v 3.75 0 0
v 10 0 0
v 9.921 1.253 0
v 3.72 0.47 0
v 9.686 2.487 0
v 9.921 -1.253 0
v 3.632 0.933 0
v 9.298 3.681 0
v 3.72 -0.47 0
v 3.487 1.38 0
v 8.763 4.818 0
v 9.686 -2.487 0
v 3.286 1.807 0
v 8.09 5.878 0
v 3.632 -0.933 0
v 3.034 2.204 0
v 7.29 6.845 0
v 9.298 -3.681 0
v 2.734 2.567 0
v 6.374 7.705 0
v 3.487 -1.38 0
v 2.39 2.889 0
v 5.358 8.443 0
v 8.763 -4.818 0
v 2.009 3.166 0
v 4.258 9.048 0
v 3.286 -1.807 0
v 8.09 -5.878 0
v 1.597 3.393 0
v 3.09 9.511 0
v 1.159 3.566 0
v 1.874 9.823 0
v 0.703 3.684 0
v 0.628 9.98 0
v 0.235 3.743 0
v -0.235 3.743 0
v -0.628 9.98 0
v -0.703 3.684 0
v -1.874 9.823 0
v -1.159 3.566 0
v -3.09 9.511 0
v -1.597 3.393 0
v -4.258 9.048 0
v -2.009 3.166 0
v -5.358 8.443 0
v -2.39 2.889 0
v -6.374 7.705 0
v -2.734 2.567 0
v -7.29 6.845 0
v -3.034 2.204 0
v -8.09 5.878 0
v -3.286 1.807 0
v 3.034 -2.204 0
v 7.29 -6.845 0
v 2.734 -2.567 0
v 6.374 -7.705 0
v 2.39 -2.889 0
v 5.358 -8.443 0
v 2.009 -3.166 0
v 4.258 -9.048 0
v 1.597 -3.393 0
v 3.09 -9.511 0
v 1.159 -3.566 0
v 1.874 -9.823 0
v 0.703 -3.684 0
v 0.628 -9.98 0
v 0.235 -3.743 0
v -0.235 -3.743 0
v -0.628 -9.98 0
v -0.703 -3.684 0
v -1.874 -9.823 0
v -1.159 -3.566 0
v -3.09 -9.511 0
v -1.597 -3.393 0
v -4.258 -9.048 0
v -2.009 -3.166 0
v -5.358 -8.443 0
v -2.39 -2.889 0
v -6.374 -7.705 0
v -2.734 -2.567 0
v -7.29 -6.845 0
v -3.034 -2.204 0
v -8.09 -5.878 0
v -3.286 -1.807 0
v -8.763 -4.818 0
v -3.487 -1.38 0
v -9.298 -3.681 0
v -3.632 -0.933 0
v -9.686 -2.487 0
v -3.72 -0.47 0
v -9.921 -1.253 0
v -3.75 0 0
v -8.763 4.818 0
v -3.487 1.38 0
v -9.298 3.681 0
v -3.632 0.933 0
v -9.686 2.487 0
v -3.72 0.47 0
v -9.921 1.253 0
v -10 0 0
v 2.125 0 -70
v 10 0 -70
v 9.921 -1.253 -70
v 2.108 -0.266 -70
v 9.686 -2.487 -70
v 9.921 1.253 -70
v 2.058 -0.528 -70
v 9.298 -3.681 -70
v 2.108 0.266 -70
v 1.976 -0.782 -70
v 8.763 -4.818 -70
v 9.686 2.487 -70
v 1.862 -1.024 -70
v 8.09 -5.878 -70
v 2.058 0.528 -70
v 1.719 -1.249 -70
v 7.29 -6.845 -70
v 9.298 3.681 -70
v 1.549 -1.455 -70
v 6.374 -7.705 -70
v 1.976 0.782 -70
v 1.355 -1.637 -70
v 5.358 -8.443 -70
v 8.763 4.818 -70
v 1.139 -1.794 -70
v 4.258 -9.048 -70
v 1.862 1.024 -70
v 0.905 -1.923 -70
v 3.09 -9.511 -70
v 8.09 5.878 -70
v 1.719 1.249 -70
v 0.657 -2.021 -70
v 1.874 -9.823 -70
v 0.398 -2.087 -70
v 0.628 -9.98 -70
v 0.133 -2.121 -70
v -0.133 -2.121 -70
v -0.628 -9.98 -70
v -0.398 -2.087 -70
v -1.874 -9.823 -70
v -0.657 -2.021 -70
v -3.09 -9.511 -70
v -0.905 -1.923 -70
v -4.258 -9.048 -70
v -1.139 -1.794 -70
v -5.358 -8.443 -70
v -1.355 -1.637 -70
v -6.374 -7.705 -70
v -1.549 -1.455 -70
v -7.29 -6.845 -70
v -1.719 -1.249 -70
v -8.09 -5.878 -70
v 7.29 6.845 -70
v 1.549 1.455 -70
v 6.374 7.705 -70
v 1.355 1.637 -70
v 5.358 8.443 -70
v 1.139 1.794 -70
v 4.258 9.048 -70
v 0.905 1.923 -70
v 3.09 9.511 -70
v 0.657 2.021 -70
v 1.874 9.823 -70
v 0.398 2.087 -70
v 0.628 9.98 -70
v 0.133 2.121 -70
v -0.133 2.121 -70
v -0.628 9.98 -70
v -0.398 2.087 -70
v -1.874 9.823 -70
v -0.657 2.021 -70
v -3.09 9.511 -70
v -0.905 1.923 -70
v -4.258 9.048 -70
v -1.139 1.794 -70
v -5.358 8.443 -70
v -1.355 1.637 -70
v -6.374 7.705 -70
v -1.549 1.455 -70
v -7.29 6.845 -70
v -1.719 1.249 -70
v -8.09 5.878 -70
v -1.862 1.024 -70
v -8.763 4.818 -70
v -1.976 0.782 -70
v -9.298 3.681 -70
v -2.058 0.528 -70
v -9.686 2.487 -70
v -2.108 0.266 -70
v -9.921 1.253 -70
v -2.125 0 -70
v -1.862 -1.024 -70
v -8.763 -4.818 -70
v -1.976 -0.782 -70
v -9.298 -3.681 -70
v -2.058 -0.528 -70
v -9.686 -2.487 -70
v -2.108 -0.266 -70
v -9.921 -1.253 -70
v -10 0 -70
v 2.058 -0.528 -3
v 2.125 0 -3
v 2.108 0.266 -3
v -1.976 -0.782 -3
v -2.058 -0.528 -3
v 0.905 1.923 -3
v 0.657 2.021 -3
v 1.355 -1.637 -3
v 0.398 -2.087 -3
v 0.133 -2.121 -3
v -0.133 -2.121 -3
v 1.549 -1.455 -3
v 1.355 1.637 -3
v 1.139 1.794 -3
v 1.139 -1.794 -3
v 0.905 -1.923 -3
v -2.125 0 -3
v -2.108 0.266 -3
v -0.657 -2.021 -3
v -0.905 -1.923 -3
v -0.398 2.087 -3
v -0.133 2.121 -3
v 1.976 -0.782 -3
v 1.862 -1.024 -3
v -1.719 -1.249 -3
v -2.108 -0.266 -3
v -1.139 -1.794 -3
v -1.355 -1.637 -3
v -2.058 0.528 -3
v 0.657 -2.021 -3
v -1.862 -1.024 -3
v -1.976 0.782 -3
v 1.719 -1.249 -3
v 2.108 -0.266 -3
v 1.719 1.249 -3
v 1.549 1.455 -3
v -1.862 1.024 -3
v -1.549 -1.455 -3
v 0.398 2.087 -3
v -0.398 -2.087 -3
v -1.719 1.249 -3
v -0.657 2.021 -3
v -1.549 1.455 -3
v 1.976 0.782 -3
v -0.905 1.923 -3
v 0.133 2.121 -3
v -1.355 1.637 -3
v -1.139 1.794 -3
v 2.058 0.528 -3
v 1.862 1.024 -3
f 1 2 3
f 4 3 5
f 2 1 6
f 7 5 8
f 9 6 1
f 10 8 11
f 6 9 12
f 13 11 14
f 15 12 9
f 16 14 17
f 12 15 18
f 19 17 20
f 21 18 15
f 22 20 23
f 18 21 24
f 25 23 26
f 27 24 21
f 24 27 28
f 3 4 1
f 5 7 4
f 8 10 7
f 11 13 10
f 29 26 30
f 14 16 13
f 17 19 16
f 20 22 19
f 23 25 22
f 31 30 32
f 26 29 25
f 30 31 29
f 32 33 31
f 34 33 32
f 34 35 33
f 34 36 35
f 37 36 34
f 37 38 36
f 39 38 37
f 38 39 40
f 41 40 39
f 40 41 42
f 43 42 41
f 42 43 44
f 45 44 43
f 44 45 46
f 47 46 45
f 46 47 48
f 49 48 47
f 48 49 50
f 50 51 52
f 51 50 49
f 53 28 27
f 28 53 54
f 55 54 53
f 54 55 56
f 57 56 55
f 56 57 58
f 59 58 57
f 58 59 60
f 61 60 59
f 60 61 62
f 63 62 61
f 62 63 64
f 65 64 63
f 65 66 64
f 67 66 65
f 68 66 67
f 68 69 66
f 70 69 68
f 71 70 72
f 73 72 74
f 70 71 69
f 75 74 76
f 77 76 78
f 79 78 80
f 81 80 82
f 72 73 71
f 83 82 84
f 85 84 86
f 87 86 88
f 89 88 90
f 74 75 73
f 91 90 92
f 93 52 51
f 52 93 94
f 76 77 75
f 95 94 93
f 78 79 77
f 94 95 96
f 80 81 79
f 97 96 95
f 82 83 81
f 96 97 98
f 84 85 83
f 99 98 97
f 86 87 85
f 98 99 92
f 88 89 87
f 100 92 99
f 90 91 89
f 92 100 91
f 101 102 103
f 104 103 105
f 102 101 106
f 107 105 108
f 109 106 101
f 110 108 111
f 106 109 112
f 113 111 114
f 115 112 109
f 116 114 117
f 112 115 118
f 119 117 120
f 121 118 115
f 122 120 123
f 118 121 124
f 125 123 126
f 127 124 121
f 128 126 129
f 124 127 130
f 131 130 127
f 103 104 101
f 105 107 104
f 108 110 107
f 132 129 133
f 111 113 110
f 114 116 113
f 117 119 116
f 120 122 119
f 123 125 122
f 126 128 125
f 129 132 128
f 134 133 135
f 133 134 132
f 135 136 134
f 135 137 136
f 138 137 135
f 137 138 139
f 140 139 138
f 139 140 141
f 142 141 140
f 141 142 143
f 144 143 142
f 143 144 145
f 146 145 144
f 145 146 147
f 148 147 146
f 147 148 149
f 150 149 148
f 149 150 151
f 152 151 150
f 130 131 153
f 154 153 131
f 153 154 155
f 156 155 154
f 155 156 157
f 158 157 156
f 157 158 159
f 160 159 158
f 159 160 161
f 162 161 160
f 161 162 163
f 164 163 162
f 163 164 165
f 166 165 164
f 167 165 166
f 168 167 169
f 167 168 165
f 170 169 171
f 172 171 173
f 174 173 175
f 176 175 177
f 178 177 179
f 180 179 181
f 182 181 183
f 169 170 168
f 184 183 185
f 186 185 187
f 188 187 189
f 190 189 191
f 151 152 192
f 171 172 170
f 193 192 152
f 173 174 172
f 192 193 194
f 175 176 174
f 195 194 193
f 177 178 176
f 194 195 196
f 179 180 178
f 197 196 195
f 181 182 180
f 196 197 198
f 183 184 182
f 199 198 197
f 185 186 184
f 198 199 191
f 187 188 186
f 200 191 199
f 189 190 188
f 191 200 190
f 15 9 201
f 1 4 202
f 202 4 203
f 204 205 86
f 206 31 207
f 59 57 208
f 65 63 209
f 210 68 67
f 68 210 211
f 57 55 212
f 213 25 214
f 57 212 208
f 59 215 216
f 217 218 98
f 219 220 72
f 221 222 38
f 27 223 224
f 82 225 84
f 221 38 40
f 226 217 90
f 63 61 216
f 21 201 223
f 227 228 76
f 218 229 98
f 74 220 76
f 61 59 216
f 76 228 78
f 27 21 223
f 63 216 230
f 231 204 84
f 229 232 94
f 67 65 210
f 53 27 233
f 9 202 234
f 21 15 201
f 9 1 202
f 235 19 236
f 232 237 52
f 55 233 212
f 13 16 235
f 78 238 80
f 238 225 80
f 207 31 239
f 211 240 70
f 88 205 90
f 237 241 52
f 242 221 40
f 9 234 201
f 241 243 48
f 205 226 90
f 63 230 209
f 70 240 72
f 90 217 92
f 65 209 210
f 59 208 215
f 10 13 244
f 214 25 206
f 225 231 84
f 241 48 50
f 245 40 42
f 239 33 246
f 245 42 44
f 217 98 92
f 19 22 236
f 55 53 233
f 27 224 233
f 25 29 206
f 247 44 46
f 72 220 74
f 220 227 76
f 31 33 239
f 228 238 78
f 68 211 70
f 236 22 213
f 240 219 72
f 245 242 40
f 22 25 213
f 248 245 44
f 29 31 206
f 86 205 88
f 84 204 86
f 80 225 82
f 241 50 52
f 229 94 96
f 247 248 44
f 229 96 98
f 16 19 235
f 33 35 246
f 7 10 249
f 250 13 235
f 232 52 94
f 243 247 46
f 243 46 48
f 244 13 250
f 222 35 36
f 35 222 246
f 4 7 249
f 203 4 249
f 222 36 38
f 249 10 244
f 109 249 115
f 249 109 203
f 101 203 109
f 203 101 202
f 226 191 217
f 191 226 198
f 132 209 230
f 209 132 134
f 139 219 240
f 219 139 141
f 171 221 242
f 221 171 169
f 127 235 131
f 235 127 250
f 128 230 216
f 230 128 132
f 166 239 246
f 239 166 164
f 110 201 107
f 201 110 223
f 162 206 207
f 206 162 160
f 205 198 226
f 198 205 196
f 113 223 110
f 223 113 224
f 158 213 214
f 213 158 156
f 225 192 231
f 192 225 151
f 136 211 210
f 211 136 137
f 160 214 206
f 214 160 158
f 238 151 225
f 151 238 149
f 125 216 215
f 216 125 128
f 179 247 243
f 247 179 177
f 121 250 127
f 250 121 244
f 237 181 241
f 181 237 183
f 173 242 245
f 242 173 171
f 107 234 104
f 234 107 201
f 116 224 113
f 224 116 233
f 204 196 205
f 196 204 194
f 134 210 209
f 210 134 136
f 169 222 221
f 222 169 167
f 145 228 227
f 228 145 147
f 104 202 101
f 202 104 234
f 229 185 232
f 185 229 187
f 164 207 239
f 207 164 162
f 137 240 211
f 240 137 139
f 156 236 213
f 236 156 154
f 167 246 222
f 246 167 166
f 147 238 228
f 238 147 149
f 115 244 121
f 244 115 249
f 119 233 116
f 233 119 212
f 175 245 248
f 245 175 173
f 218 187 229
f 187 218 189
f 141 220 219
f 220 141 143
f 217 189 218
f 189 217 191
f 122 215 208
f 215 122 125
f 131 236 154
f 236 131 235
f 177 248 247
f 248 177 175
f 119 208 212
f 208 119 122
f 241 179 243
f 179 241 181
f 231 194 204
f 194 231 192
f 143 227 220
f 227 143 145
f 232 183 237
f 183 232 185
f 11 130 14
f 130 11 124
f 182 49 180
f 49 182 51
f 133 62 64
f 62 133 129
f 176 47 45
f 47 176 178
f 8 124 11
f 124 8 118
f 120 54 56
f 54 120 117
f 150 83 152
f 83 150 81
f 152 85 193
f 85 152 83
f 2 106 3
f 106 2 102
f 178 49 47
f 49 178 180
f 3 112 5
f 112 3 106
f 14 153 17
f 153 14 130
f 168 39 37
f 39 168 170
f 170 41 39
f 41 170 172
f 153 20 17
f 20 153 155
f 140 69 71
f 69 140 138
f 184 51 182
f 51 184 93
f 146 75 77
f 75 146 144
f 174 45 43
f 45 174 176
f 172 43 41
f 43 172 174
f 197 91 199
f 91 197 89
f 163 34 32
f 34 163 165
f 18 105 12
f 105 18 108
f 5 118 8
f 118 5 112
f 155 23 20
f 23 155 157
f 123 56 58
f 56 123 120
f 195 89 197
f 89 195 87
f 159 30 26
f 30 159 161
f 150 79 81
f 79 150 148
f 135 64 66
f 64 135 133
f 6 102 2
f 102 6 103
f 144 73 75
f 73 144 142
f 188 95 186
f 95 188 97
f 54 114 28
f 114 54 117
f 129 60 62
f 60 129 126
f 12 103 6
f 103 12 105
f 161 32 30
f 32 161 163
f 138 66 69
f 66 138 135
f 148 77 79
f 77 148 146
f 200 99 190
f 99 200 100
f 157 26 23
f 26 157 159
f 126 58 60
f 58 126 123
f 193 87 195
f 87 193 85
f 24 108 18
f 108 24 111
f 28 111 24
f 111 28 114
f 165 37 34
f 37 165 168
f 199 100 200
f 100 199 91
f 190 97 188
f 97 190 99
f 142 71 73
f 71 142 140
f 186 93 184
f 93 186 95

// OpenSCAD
$fn = 50;


difference() {
	union() {
		translate(v = [0, 0, -70.0000000000]) {
			cylinder(h = 70, r = 10.0000000000);
		}
		cylinder(h = 0, r = 13.0000000000);
	}
	union() {
		translate(v = [0, 0, 0]) {
			rotate(a = [0, 0, 0]) {
				difference() {
					union() {
						#translate(v = [0, 0, -70.0000000000]) {
							cylinder(h = 70, r = 2.0000000000);
						}
						#translate(v = [0, 0, -3]) {
							cylinder(h = 3, r = 10.0000000000, r1 = 2.1250000000, r2 = 3.7500000000);
						}
						#translate(v = [0, 0, -70.0000000000]) {
							cylinder(h = 70, r = 2.1250000000);
						}
						#translate(v = [0, 0, -70.0000000000]) {
							cylinder(h = 70, r = 2.0000000000);
						}
					}
					union();
				}
			}
		}
	}
}
